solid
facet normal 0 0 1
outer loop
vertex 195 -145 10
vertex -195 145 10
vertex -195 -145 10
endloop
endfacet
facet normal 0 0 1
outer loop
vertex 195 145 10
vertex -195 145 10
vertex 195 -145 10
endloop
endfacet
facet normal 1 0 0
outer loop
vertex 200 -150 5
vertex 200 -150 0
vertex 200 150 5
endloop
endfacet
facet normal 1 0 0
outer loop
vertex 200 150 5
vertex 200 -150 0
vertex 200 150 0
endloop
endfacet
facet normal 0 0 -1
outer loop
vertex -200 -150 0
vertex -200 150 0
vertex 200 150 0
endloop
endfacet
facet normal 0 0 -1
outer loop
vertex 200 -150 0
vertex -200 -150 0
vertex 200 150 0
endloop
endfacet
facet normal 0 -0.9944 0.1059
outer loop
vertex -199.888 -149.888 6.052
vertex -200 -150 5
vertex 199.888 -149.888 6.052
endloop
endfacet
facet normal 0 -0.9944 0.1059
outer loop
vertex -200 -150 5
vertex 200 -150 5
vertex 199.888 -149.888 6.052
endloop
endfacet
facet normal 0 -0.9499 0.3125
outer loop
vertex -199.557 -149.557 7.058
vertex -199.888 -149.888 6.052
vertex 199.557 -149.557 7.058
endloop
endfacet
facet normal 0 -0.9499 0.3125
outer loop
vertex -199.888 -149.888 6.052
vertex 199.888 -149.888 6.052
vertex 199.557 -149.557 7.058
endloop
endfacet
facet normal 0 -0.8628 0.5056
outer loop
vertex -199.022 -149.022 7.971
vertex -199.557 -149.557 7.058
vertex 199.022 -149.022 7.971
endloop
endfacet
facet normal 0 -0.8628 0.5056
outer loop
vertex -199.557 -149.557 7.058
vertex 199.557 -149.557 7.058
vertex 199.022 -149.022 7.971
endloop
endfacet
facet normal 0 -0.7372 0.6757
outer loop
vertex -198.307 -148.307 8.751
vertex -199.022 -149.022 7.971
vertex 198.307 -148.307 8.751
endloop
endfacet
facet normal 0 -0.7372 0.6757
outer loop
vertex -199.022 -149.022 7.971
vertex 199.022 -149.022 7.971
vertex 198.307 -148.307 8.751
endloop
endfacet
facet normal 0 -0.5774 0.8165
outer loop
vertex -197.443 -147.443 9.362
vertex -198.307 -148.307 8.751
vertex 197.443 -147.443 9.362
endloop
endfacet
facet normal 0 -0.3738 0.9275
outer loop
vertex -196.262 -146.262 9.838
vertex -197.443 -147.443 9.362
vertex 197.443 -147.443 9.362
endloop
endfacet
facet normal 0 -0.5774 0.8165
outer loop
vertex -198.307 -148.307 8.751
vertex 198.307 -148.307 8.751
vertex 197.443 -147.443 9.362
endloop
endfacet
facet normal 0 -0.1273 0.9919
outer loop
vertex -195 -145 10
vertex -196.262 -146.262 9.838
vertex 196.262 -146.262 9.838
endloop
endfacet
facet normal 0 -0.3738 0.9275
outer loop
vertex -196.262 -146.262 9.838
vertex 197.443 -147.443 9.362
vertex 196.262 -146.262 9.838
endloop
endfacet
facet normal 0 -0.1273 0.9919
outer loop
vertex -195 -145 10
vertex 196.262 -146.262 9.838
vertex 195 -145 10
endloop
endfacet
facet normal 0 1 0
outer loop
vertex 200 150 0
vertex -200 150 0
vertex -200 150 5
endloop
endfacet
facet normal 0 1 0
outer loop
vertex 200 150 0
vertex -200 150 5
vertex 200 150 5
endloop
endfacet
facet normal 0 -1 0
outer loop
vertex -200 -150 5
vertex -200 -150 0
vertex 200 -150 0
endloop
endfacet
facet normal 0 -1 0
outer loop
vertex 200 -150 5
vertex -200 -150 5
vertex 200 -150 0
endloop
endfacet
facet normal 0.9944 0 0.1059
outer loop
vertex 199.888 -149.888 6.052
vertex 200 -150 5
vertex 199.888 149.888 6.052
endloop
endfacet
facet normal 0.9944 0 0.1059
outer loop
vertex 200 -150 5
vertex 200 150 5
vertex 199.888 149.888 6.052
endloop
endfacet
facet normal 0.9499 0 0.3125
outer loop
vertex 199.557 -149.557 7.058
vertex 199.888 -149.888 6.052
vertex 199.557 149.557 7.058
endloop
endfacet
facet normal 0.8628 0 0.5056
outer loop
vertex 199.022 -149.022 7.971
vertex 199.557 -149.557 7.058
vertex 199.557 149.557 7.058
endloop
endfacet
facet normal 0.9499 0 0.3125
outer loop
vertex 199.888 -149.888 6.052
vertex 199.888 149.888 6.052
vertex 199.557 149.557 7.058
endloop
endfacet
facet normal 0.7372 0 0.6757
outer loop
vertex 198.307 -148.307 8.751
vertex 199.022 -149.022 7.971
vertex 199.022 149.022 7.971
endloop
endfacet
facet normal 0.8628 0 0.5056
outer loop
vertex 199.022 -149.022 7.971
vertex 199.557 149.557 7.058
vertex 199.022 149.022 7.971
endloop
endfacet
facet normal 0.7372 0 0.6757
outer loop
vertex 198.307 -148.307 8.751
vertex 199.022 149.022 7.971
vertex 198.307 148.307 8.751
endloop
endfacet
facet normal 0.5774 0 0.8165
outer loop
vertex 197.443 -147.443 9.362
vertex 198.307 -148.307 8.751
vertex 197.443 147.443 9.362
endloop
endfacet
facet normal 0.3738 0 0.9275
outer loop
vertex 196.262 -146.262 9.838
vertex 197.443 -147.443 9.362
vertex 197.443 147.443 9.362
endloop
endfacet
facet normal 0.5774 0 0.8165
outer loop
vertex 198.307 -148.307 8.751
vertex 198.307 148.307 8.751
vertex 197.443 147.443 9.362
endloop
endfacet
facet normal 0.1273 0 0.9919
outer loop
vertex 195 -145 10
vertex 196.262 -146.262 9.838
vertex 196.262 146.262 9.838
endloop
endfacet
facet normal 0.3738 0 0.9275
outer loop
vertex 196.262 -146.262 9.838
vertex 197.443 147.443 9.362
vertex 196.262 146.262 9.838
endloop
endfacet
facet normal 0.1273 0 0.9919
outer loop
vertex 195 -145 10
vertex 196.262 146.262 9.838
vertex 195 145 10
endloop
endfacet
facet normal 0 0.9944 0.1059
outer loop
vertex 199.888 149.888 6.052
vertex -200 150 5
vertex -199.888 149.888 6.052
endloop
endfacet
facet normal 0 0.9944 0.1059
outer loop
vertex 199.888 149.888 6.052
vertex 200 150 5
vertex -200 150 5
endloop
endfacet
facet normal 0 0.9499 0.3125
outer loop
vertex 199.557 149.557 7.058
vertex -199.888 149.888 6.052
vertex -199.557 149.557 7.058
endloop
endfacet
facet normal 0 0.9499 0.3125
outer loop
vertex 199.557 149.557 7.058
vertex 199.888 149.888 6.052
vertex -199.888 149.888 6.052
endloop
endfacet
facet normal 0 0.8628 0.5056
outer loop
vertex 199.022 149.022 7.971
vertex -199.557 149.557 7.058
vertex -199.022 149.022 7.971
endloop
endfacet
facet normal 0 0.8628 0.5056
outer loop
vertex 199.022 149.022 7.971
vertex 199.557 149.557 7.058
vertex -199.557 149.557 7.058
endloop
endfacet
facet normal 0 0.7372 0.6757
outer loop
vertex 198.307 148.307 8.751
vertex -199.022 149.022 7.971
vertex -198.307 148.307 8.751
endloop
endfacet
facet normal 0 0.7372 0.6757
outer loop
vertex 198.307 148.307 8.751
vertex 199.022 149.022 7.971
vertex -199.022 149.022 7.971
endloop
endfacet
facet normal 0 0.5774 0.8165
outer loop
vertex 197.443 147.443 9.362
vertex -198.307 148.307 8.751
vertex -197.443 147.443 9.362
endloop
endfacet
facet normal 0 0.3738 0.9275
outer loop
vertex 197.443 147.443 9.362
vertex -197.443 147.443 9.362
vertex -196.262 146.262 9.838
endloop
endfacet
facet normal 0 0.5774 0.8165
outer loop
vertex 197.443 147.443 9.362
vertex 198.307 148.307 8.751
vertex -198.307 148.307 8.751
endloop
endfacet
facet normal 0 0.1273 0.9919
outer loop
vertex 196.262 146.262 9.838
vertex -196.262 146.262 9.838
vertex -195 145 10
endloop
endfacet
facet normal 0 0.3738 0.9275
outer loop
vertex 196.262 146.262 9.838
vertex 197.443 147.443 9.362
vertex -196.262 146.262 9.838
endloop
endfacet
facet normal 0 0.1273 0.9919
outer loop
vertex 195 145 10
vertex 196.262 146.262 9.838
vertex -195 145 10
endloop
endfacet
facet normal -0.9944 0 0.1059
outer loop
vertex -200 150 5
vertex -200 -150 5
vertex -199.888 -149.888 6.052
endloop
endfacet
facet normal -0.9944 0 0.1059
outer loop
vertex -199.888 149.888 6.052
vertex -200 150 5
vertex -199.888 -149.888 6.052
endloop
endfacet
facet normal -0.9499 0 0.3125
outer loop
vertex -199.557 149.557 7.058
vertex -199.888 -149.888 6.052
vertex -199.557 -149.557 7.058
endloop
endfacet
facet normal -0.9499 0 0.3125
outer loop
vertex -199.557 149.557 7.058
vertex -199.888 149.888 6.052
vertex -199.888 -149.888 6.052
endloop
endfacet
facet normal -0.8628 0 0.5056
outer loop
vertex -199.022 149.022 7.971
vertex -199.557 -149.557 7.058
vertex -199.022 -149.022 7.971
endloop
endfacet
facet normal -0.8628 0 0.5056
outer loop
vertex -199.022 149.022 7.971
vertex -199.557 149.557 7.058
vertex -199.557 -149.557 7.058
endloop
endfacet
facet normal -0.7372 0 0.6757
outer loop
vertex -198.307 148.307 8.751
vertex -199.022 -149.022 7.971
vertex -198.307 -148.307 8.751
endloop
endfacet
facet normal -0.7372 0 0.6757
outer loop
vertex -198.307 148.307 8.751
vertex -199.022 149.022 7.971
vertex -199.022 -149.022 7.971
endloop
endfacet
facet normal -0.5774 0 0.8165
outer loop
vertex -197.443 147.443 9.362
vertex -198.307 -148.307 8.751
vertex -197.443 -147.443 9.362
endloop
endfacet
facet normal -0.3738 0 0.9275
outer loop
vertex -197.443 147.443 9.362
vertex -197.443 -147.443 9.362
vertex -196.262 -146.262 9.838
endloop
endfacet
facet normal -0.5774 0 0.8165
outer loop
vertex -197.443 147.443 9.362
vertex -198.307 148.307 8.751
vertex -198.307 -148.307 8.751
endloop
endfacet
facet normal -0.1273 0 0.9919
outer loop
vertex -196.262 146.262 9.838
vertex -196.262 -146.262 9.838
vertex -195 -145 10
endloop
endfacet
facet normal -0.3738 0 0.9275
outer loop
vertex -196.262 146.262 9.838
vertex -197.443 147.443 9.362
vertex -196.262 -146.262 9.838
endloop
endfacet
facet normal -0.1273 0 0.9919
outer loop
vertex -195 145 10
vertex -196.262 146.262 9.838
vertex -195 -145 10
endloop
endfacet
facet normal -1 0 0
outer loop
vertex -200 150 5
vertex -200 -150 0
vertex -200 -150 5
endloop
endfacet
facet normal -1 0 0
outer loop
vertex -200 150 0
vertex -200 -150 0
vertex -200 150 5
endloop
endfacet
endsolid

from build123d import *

# Parameters (mm, degrees)
F0_W     = 276
F0_H     = 126
F1_DEPTH = 12
F2_R     = 5
F4_W     = 400
F4_H     = 300
F5_DEPTH = 10
F6_R     = 5


with BuildPart() as f1:
    # F0 (on Top) → F1 (new body)
    with BuildSketch(Plane.XY):
        Rectangle(F0_W, F0_H)
    extrude(amount=F1_DEPTH)

    # F2
    f2_edges = [f1.edges().sort_by_distance(p)[0] for p in [
        (0, -63, 12),
        (-138, 0, 12),
        (138, 0, 12),
        (0, 63, 12),
    ]]
    fillet(f2_edges, radius=F2_R)


with BuildPart() as f5:
    # F4 (on Top) → F5 (new body)
    with BuildSketch(Plane.XY):
        Rectangle(F4_W, F4_H)
    extrude(amount=F5_DEPTH)

    # F6
    f6_edges = [f5.edges().sort_by_distance(p)[0] for p in [
        (0, -150, 10),
        (-200, 0, 10),
        (200, 0, 10),
        (0, 150, 10),
    ]]
    fillet(f6_edges, radius=F6_R)


solid = f5.part
